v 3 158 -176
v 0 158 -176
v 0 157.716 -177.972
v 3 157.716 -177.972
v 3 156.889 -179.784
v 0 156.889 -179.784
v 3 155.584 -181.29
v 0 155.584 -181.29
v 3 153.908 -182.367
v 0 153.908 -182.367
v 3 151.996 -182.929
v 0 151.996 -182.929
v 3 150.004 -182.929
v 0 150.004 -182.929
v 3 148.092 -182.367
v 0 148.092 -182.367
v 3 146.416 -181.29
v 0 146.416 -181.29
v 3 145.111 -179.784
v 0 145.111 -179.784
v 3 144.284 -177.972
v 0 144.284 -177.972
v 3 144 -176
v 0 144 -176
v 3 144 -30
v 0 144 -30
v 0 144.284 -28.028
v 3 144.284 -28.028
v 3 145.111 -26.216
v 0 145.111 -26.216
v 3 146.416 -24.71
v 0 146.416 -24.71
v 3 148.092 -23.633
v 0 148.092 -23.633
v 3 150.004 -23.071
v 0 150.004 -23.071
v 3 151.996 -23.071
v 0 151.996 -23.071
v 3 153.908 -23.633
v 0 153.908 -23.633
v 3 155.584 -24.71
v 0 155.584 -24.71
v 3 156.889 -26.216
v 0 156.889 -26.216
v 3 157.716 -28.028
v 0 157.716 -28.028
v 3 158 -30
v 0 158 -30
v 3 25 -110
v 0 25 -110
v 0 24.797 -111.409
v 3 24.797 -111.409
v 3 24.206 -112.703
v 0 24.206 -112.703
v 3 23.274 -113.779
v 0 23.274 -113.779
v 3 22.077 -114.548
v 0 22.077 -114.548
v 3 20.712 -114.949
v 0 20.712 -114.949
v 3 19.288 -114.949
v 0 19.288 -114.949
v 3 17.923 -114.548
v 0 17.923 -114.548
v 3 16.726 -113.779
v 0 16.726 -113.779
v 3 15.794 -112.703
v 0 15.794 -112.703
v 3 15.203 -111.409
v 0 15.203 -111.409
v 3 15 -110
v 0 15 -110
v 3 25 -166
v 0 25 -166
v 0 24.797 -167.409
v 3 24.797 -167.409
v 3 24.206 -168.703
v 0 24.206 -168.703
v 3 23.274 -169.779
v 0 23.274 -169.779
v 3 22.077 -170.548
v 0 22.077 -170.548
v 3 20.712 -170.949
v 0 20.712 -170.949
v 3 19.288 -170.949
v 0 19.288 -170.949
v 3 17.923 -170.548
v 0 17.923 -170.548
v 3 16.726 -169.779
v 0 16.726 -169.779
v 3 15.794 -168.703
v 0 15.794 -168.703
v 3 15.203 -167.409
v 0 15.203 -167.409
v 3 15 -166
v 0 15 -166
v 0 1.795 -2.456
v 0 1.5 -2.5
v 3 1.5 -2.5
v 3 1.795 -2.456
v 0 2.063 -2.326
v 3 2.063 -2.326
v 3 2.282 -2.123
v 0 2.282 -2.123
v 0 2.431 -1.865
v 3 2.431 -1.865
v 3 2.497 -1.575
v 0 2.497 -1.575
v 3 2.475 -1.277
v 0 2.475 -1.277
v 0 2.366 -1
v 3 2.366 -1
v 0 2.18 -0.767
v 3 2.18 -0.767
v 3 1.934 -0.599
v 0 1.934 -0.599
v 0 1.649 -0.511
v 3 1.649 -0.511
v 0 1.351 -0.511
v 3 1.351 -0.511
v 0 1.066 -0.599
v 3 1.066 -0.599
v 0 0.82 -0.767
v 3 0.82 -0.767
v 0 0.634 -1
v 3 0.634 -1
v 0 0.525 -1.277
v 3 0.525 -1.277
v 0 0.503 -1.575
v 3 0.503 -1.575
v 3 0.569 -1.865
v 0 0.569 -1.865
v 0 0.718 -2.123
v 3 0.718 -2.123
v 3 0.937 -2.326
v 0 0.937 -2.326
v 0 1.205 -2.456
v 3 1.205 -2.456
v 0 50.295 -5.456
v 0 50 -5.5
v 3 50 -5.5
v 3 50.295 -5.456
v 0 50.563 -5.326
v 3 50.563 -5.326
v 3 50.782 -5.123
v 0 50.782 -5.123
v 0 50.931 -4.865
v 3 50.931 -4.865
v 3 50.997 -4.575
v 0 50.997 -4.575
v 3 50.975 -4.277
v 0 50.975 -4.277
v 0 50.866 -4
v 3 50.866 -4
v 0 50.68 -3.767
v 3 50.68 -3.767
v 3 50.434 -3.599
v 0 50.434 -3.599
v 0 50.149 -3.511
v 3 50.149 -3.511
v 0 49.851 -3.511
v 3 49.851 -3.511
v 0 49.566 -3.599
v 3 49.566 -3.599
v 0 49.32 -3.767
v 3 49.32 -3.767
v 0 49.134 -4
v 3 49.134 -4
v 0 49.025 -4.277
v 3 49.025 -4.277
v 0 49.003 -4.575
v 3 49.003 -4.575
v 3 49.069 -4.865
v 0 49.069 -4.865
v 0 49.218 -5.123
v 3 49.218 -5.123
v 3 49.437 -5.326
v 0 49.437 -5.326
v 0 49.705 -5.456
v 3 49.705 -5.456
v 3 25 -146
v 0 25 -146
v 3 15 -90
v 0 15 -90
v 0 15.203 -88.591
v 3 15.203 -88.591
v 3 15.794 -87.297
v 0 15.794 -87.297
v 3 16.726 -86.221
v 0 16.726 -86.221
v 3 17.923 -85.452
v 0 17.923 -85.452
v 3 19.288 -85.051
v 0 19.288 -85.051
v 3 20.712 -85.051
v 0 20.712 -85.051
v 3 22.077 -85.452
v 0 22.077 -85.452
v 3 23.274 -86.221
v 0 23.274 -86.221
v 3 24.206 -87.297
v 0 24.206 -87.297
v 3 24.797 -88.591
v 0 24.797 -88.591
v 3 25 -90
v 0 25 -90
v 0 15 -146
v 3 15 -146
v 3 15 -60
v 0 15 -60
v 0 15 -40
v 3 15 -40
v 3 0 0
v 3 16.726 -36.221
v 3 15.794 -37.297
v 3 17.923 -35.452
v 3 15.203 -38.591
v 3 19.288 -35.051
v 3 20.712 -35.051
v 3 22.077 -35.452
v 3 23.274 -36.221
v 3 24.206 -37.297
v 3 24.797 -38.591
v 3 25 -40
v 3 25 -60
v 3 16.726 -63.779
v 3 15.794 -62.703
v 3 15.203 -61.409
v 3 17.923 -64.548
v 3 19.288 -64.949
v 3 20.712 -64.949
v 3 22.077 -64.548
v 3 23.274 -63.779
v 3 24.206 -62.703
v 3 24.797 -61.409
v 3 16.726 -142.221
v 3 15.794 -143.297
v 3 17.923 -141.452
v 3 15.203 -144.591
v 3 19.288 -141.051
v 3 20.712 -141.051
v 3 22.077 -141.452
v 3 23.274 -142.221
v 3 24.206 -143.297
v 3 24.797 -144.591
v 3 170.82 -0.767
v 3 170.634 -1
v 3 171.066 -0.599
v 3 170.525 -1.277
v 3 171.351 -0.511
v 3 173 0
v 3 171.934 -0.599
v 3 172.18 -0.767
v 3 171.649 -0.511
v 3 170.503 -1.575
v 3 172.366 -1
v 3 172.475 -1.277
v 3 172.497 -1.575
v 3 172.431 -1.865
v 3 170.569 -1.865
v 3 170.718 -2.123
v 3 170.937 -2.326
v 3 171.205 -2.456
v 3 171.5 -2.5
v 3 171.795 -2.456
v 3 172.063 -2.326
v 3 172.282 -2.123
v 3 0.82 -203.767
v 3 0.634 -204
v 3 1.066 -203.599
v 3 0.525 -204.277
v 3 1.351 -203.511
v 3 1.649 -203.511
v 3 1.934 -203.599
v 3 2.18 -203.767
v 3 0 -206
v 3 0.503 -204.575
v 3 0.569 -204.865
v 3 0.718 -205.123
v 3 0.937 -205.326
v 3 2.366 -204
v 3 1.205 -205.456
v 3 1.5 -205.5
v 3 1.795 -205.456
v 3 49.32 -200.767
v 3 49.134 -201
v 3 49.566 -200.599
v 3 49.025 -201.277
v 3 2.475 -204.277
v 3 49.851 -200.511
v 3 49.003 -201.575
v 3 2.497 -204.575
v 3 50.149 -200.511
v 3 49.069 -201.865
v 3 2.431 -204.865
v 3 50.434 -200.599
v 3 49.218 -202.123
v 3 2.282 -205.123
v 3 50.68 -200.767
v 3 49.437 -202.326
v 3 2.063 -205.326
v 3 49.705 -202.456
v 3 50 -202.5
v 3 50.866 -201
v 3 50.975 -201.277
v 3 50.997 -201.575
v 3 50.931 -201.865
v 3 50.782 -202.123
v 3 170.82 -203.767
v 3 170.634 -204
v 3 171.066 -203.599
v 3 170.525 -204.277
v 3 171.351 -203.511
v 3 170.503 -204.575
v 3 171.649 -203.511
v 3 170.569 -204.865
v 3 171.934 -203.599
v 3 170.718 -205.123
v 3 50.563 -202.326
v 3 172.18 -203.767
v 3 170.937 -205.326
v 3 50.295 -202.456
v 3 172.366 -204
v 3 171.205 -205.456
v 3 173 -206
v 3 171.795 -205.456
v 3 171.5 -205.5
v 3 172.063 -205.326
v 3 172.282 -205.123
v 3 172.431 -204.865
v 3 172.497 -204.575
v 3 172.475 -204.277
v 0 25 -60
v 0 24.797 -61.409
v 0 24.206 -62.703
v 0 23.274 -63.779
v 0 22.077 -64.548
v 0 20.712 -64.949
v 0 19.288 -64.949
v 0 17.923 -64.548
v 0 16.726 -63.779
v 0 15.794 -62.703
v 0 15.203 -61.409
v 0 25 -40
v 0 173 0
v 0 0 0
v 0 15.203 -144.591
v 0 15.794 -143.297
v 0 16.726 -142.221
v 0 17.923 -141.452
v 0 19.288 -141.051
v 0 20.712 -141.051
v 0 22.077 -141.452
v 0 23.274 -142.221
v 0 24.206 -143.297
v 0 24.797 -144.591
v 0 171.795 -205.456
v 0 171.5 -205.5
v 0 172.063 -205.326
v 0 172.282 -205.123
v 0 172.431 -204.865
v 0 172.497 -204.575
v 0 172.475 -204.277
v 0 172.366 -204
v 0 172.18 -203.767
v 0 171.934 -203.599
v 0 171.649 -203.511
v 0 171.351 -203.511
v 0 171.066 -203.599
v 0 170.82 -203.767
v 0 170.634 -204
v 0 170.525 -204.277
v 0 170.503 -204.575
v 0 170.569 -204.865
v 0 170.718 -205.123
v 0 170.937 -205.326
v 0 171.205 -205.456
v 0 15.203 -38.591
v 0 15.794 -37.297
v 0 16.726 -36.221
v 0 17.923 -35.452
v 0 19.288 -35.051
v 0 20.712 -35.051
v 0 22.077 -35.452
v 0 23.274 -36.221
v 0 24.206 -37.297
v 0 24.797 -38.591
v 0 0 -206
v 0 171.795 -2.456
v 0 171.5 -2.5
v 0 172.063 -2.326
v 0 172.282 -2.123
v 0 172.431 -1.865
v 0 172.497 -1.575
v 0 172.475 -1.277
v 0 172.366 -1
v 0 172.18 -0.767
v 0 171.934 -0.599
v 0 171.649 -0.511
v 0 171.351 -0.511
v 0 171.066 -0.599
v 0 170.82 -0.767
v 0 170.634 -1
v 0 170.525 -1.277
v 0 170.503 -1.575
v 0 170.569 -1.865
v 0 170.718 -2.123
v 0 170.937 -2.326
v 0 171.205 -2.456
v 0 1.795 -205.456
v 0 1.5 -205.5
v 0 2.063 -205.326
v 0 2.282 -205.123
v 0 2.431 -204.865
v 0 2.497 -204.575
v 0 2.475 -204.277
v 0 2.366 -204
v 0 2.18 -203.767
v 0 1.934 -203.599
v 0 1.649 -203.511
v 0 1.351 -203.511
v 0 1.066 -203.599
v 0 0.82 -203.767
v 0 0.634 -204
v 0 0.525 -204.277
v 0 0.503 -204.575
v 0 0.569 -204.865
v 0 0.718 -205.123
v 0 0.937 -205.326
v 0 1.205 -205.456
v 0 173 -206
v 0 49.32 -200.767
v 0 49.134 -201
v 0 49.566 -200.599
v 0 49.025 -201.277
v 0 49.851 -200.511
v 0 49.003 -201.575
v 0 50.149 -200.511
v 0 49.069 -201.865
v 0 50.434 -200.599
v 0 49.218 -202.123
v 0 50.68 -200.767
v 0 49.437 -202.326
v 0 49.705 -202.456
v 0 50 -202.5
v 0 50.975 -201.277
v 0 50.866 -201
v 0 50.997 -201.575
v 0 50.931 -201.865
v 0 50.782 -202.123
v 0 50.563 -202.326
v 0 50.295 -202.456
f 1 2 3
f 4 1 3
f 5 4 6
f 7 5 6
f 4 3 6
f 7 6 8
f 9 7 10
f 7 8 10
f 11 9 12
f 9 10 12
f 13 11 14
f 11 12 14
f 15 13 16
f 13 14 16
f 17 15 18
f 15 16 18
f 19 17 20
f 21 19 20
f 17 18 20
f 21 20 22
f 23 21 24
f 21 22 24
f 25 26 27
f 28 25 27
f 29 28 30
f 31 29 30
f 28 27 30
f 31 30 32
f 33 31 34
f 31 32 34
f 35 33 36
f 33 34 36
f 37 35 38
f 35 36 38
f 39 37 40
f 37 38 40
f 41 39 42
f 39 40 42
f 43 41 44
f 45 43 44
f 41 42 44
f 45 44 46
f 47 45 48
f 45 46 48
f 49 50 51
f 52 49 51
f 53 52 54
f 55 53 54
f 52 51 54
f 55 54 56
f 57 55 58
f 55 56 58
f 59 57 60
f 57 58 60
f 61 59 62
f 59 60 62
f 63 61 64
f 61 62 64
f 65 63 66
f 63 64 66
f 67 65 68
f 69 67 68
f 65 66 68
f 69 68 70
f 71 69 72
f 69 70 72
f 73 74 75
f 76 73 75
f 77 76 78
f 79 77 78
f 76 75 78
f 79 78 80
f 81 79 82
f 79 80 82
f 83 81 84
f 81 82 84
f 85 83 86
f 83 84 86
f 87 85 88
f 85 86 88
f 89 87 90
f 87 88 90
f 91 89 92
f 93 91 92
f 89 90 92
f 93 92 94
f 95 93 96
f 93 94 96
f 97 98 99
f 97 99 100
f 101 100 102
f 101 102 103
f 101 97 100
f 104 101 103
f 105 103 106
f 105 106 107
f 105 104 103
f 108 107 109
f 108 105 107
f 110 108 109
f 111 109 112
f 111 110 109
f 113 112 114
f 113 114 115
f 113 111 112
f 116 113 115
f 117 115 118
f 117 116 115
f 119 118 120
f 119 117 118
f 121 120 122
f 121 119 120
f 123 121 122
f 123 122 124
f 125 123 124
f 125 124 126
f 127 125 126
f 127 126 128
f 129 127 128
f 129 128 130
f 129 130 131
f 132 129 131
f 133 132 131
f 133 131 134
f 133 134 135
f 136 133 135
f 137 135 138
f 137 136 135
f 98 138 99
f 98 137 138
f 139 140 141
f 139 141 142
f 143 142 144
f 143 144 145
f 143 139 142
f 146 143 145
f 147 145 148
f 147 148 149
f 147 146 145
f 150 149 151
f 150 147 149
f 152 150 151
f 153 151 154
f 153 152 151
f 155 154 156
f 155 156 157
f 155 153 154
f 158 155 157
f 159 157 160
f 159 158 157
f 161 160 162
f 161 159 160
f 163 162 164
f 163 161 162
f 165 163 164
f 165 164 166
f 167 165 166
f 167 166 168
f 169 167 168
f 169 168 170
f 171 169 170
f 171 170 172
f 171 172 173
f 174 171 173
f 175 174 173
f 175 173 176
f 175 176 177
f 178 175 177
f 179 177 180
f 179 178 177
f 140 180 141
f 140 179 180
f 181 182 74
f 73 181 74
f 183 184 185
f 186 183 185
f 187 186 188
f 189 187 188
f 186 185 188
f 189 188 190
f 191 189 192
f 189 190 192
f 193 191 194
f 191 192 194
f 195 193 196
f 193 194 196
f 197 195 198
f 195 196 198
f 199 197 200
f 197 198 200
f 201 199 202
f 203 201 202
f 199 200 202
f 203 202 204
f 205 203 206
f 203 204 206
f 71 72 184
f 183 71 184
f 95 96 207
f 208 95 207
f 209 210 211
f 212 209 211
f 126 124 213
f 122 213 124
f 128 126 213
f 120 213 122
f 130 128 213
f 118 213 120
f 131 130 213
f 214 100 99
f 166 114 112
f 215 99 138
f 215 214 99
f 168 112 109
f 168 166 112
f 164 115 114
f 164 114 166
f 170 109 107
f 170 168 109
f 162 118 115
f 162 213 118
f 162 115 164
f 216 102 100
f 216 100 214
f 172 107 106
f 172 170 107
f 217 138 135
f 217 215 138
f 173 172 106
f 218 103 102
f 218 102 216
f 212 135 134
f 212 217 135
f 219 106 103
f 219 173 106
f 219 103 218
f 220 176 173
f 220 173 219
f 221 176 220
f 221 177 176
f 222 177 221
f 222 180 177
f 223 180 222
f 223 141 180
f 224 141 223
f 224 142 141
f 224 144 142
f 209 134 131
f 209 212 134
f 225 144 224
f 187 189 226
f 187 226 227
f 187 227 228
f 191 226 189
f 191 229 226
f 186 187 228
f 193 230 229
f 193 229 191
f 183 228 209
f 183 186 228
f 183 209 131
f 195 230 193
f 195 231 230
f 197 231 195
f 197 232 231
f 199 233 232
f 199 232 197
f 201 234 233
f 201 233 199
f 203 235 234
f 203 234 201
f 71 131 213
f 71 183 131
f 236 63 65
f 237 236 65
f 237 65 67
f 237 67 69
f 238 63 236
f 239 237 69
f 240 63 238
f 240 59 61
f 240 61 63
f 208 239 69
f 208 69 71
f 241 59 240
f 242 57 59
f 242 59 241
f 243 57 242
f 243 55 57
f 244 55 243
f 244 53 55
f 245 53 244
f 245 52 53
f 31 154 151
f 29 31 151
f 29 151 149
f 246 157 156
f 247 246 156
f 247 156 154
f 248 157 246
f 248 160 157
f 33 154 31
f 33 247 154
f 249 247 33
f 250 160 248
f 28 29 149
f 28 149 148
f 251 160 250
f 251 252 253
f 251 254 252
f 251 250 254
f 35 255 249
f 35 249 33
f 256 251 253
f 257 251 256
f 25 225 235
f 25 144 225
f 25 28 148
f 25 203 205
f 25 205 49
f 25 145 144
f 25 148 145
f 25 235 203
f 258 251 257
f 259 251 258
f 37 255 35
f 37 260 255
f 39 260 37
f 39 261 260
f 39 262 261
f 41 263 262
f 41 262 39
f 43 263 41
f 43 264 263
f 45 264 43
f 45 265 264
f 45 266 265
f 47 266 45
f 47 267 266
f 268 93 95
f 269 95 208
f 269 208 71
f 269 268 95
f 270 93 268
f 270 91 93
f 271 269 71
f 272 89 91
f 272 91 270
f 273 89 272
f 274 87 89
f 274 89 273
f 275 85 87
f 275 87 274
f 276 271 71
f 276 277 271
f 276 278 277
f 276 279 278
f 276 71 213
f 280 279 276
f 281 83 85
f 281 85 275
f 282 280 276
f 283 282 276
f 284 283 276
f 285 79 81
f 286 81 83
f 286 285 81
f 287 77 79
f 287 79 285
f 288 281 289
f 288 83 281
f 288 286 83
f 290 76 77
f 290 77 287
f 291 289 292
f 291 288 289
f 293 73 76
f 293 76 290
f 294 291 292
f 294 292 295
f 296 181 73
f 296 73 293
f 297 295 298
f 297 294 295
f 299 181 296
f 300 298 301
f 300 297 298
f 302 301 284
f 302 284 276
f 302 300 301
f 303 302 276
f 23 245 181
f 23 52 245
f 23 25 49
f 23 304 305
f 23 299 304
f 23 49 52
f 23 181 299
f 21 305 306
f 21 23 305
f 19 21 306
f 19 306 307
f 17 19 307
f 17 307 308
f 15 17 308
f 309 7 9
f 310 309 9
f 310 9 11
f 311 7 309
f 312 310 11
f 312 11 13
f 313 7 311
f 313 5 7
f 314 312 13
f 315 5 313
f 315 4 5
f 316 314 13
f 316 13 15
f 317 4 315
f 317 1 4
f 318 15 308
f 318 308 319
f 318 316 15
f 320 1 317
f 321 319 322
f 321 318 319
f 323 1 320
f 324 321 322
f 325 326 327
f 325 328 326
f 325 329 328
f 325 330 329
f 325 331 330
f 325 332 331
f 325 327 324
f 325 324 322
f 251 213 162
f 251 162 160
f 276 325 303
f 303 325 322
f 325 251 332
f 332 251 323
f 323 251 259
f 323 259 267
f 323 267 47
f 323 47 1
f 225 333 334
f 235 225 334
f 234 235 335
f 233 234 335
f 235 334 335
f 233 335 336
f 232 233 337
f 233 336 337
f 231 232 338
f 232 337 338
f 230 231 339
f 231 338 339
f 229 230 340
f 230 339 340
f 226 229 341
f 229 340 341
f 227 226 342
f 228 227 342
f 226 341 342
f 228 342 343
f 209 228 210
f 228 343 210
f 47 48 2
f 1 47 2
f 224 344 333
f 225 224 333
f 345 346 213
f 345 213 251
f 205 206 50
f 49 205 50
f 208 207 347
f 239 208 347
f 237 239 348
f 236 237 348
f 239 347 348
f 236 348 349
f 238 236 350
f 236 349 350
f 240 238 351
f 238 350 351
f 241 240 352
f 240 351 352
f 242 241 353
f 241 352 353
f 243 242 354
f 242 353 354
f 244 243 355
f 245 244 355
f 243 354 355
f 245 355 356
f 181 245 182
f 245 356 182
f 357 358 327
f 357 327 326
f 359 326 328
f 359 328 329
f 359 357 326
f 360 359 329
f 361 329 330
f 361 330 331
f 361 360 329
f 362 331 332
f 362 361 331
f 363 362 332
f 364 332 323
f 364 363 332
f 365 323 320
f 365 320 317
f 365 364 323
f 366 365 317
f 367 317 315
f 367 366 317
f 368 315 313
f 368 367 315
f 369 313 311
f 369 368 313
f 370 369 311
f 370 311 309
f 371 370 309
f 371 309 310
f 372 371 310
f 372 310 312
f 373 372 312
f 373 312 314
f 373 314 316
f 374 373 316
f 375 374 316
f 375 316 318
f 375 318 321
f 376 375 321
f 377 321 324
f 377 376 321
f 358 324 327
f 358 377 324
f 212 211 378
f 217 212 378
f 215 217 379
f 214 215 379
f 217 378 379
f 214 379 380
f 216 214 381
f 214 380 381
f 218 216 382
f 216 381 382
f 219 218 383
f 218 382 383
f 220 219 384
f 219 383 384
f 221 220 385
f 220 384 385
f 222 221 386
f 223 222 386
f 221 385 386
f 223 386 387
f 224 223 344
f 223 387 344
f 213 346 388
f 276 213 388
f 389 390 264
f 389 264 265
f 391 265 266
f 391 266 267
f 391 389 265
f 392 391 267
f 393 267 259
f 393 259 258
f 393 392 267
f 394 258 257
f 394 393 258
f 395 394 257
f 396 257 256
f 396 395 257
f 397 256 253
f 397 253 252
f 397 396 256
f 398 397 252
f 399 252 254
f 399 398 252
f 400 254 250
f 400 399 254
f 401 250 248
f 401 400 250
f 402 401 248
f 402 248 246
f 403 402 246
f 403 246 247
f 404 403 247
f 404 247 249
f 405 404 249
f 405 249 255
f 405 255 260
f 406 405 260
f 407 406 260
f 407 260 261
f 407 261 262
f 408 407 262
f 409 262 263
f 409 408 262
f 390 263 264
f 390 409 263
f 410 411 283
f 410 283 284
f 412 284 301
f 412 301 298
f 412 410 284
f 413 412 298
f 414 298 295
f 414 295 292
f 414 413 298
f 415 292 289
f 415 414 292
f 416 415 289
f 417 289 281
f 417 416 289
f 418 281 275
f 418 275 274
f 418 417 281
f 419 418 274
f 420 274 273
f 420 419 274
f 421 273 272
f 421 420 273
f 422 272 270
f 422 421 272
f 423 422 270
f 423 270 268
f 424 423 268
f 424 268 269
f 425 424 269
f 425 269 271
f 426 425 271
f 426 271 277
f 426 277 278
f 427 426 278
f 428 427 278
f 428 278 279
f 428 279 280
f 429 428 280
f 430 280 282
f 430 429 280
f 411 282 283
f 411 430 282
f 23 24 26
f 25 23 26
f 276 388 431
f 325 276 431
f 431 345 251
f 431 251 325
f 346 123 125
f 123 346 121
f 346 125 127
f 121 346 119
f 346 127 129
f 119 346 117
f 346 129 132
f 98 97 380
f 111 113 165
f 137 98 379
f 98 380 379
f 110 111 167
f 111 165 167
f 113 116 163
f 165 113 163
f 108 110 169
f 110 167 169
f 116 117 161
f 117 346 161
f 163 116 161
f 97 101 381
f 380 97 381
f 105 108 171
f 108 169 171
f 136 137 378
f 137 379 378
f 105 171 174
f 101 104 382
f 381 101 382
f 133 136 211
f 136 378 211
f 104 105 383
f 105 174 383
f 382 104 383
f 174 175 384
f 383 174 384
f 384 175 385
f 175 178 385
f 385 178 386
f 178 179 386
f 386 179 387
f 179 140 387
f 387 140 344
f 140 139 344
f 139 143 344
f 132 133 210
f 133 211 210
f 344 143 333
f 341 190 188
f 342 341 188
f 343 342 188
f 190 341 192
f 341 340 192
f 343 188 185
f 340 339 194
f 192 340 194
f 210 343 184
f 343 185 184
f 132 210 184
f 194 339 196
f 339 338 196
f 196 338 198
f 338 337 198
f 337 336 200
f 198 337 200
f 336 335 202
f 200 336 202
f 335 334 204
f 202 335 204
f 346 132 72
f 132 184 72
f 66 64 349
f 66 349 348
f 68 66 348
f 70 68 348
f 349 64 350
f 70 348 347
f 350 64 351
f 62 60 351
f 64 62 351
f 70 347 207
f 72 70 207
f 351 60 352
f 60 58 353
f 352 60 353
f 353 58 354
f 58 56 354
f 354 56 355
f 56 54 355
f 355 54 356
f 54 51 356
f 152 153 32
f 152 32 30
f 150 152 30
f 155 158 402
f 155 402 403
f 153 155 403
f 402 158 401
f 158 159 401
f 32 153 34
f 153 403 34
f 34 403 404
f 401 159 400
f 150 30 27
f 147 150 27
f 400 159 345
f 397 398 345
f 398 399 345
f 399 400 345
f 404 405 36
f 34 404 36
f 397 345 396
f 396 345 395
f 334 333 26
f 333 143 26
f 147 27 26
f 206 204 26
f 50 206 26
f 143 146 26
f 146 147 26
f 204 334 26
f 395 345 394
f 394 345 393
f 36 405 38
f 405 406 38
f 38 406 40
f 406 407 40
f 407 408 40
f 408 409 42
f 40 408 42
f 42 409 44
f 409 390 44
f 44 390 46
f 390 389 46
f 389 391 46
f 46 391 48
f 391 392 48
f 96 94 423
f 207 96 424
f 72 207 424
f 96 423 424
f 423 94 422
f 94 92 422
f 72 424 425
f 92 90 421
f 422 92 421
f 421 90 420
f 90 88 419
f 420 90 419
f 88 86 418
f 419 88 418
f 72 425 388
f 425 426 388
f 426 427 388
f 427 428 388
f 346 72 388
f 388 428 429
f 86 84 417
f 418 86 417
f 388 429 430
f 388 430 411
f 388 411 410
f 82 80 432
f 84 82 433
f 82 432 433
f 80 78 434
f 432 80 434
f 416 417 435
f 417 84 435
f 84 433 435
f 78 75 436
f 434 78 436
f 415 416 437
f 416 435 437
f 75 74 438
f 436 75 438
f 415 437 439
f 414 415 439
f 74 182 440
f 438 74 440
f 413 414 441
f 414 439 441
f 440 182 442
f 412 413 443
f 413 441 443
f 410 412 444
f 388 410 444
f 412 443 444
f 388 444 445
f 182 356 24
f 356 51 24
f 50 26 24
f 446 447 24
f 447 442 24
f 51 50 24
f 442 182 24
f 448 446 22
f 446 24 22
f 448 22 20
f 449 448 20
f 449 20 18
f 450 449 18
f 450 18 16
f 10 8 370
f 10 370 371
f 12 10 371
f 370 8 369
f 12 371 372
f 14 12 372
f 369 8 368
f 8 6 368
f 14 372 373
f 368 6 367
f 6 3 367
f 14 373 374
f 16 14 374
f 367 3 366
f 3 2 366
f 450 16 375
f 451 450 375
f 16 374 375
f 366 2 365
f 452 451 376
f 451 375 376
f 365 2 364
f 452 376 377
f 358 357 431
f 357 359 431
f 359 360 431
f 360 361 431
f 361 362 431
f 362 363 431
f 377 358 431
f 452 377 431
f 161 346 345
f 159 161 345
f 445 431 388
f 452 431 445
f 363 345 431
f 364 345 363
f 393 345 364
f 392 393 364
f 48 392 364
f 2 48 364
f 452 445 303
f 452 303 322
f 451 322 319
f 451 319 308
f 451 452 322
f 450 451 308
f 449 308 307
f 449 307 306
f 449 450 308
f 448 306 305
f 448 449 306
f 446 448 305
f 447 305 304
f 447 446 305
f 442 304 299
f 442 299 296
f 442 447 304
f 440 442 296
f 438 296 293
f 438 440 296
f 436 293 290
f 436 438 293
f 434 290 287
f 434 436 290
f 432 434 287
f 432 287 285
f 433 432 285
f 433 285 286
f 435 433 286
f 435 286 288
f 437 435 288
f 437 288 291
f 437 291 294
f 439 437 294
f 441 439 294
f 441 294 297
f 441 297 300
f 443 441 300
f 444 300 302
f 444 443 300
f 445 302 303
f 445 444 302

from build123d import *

# Parameters (mm, degrees)
SKETCH1_W           = 206
SKETCH1_H           = 173
SKETCH1_R           = 1
BOSS_EXTRUDE1_DEPTH = 3


with BuildPart() as part:
    # Sketch1 → Boss-Extrude1 (new body)
    with BuildSketch(Plane(origin=(0, 0, 0), x_dir=(0, 0, -1), z_dir=(1, 0, 0))):
        with Locations((103, 86.5)):
            Rectangle(SKETCH1_W, SKETCH1_H)
        with Locations((204.5, 171.5)):
            Circle(SKETCH1_R, mode=Mode.SUBTRACT)
        with Locations((204.5, 1.5)):
            Circle(SKETCH1_R, mode=Mode.SUBTRACT)
        with Locations((1.5, 171.5)):
            Circle(SKETCH1_R, mode=Mode.SUBTRACT)
        with Locations((1.5, 1.5)):
            Circle(SKETCH1_R, mode=Mode.SUBTRACT)
        with Locations((201.5, 50)):
            Circle(SKETCH1_R, mode=Mode.SUBTRACT)
        with Locations((4.5, 50)):
            Circle(SKETCH1_R, mode=Mode.SUBTRACT)
        with BuildLine():
            Line((30, 158), (176, 158))
            ThreePointArc((176, 158), (183, 151), (176, 144))
            Line((176, 144), (30, 144))
            ThreePointArc((30, 144), (23, 151), (30, 158))
        make_face(mode=Mode.SUBTRACT)
        with BuildLine():
            Line((40, 25), (60, 25))
            ThreePointArc((60, 25), (65, 20), (60, 15))
            Line((60, 15), (40, 15))
            ThreePointArc((40, 15), (35, 20), (40, 25))
        make_face(mode=Mode.SUBTRACT)
        with BuildLine():
            Line((90, 25), (110, 25))
            ThreePointArc((110, 25), (115, 20), (110, 15))
            Line((110, 15), (90, 15))
            ThreePointArc((90, 15), (85, 20), (90, 25))
        make_face(mode=Mode.SUBTRACT)
        with BuildLine():
            Line((146, 25), (166, 25))
            ThreePointArc((166, 25), (171, 20), (166, 15))
            Line((166, 15), (146, 15))
            ThreePointArc((146, 15), (141, 20), (146, 25))
        make_face(mode=Mode.SUBTRACT)
    extrude(amount=BOSS_EXTRUDE1_DEPTH)


solid = part.part
